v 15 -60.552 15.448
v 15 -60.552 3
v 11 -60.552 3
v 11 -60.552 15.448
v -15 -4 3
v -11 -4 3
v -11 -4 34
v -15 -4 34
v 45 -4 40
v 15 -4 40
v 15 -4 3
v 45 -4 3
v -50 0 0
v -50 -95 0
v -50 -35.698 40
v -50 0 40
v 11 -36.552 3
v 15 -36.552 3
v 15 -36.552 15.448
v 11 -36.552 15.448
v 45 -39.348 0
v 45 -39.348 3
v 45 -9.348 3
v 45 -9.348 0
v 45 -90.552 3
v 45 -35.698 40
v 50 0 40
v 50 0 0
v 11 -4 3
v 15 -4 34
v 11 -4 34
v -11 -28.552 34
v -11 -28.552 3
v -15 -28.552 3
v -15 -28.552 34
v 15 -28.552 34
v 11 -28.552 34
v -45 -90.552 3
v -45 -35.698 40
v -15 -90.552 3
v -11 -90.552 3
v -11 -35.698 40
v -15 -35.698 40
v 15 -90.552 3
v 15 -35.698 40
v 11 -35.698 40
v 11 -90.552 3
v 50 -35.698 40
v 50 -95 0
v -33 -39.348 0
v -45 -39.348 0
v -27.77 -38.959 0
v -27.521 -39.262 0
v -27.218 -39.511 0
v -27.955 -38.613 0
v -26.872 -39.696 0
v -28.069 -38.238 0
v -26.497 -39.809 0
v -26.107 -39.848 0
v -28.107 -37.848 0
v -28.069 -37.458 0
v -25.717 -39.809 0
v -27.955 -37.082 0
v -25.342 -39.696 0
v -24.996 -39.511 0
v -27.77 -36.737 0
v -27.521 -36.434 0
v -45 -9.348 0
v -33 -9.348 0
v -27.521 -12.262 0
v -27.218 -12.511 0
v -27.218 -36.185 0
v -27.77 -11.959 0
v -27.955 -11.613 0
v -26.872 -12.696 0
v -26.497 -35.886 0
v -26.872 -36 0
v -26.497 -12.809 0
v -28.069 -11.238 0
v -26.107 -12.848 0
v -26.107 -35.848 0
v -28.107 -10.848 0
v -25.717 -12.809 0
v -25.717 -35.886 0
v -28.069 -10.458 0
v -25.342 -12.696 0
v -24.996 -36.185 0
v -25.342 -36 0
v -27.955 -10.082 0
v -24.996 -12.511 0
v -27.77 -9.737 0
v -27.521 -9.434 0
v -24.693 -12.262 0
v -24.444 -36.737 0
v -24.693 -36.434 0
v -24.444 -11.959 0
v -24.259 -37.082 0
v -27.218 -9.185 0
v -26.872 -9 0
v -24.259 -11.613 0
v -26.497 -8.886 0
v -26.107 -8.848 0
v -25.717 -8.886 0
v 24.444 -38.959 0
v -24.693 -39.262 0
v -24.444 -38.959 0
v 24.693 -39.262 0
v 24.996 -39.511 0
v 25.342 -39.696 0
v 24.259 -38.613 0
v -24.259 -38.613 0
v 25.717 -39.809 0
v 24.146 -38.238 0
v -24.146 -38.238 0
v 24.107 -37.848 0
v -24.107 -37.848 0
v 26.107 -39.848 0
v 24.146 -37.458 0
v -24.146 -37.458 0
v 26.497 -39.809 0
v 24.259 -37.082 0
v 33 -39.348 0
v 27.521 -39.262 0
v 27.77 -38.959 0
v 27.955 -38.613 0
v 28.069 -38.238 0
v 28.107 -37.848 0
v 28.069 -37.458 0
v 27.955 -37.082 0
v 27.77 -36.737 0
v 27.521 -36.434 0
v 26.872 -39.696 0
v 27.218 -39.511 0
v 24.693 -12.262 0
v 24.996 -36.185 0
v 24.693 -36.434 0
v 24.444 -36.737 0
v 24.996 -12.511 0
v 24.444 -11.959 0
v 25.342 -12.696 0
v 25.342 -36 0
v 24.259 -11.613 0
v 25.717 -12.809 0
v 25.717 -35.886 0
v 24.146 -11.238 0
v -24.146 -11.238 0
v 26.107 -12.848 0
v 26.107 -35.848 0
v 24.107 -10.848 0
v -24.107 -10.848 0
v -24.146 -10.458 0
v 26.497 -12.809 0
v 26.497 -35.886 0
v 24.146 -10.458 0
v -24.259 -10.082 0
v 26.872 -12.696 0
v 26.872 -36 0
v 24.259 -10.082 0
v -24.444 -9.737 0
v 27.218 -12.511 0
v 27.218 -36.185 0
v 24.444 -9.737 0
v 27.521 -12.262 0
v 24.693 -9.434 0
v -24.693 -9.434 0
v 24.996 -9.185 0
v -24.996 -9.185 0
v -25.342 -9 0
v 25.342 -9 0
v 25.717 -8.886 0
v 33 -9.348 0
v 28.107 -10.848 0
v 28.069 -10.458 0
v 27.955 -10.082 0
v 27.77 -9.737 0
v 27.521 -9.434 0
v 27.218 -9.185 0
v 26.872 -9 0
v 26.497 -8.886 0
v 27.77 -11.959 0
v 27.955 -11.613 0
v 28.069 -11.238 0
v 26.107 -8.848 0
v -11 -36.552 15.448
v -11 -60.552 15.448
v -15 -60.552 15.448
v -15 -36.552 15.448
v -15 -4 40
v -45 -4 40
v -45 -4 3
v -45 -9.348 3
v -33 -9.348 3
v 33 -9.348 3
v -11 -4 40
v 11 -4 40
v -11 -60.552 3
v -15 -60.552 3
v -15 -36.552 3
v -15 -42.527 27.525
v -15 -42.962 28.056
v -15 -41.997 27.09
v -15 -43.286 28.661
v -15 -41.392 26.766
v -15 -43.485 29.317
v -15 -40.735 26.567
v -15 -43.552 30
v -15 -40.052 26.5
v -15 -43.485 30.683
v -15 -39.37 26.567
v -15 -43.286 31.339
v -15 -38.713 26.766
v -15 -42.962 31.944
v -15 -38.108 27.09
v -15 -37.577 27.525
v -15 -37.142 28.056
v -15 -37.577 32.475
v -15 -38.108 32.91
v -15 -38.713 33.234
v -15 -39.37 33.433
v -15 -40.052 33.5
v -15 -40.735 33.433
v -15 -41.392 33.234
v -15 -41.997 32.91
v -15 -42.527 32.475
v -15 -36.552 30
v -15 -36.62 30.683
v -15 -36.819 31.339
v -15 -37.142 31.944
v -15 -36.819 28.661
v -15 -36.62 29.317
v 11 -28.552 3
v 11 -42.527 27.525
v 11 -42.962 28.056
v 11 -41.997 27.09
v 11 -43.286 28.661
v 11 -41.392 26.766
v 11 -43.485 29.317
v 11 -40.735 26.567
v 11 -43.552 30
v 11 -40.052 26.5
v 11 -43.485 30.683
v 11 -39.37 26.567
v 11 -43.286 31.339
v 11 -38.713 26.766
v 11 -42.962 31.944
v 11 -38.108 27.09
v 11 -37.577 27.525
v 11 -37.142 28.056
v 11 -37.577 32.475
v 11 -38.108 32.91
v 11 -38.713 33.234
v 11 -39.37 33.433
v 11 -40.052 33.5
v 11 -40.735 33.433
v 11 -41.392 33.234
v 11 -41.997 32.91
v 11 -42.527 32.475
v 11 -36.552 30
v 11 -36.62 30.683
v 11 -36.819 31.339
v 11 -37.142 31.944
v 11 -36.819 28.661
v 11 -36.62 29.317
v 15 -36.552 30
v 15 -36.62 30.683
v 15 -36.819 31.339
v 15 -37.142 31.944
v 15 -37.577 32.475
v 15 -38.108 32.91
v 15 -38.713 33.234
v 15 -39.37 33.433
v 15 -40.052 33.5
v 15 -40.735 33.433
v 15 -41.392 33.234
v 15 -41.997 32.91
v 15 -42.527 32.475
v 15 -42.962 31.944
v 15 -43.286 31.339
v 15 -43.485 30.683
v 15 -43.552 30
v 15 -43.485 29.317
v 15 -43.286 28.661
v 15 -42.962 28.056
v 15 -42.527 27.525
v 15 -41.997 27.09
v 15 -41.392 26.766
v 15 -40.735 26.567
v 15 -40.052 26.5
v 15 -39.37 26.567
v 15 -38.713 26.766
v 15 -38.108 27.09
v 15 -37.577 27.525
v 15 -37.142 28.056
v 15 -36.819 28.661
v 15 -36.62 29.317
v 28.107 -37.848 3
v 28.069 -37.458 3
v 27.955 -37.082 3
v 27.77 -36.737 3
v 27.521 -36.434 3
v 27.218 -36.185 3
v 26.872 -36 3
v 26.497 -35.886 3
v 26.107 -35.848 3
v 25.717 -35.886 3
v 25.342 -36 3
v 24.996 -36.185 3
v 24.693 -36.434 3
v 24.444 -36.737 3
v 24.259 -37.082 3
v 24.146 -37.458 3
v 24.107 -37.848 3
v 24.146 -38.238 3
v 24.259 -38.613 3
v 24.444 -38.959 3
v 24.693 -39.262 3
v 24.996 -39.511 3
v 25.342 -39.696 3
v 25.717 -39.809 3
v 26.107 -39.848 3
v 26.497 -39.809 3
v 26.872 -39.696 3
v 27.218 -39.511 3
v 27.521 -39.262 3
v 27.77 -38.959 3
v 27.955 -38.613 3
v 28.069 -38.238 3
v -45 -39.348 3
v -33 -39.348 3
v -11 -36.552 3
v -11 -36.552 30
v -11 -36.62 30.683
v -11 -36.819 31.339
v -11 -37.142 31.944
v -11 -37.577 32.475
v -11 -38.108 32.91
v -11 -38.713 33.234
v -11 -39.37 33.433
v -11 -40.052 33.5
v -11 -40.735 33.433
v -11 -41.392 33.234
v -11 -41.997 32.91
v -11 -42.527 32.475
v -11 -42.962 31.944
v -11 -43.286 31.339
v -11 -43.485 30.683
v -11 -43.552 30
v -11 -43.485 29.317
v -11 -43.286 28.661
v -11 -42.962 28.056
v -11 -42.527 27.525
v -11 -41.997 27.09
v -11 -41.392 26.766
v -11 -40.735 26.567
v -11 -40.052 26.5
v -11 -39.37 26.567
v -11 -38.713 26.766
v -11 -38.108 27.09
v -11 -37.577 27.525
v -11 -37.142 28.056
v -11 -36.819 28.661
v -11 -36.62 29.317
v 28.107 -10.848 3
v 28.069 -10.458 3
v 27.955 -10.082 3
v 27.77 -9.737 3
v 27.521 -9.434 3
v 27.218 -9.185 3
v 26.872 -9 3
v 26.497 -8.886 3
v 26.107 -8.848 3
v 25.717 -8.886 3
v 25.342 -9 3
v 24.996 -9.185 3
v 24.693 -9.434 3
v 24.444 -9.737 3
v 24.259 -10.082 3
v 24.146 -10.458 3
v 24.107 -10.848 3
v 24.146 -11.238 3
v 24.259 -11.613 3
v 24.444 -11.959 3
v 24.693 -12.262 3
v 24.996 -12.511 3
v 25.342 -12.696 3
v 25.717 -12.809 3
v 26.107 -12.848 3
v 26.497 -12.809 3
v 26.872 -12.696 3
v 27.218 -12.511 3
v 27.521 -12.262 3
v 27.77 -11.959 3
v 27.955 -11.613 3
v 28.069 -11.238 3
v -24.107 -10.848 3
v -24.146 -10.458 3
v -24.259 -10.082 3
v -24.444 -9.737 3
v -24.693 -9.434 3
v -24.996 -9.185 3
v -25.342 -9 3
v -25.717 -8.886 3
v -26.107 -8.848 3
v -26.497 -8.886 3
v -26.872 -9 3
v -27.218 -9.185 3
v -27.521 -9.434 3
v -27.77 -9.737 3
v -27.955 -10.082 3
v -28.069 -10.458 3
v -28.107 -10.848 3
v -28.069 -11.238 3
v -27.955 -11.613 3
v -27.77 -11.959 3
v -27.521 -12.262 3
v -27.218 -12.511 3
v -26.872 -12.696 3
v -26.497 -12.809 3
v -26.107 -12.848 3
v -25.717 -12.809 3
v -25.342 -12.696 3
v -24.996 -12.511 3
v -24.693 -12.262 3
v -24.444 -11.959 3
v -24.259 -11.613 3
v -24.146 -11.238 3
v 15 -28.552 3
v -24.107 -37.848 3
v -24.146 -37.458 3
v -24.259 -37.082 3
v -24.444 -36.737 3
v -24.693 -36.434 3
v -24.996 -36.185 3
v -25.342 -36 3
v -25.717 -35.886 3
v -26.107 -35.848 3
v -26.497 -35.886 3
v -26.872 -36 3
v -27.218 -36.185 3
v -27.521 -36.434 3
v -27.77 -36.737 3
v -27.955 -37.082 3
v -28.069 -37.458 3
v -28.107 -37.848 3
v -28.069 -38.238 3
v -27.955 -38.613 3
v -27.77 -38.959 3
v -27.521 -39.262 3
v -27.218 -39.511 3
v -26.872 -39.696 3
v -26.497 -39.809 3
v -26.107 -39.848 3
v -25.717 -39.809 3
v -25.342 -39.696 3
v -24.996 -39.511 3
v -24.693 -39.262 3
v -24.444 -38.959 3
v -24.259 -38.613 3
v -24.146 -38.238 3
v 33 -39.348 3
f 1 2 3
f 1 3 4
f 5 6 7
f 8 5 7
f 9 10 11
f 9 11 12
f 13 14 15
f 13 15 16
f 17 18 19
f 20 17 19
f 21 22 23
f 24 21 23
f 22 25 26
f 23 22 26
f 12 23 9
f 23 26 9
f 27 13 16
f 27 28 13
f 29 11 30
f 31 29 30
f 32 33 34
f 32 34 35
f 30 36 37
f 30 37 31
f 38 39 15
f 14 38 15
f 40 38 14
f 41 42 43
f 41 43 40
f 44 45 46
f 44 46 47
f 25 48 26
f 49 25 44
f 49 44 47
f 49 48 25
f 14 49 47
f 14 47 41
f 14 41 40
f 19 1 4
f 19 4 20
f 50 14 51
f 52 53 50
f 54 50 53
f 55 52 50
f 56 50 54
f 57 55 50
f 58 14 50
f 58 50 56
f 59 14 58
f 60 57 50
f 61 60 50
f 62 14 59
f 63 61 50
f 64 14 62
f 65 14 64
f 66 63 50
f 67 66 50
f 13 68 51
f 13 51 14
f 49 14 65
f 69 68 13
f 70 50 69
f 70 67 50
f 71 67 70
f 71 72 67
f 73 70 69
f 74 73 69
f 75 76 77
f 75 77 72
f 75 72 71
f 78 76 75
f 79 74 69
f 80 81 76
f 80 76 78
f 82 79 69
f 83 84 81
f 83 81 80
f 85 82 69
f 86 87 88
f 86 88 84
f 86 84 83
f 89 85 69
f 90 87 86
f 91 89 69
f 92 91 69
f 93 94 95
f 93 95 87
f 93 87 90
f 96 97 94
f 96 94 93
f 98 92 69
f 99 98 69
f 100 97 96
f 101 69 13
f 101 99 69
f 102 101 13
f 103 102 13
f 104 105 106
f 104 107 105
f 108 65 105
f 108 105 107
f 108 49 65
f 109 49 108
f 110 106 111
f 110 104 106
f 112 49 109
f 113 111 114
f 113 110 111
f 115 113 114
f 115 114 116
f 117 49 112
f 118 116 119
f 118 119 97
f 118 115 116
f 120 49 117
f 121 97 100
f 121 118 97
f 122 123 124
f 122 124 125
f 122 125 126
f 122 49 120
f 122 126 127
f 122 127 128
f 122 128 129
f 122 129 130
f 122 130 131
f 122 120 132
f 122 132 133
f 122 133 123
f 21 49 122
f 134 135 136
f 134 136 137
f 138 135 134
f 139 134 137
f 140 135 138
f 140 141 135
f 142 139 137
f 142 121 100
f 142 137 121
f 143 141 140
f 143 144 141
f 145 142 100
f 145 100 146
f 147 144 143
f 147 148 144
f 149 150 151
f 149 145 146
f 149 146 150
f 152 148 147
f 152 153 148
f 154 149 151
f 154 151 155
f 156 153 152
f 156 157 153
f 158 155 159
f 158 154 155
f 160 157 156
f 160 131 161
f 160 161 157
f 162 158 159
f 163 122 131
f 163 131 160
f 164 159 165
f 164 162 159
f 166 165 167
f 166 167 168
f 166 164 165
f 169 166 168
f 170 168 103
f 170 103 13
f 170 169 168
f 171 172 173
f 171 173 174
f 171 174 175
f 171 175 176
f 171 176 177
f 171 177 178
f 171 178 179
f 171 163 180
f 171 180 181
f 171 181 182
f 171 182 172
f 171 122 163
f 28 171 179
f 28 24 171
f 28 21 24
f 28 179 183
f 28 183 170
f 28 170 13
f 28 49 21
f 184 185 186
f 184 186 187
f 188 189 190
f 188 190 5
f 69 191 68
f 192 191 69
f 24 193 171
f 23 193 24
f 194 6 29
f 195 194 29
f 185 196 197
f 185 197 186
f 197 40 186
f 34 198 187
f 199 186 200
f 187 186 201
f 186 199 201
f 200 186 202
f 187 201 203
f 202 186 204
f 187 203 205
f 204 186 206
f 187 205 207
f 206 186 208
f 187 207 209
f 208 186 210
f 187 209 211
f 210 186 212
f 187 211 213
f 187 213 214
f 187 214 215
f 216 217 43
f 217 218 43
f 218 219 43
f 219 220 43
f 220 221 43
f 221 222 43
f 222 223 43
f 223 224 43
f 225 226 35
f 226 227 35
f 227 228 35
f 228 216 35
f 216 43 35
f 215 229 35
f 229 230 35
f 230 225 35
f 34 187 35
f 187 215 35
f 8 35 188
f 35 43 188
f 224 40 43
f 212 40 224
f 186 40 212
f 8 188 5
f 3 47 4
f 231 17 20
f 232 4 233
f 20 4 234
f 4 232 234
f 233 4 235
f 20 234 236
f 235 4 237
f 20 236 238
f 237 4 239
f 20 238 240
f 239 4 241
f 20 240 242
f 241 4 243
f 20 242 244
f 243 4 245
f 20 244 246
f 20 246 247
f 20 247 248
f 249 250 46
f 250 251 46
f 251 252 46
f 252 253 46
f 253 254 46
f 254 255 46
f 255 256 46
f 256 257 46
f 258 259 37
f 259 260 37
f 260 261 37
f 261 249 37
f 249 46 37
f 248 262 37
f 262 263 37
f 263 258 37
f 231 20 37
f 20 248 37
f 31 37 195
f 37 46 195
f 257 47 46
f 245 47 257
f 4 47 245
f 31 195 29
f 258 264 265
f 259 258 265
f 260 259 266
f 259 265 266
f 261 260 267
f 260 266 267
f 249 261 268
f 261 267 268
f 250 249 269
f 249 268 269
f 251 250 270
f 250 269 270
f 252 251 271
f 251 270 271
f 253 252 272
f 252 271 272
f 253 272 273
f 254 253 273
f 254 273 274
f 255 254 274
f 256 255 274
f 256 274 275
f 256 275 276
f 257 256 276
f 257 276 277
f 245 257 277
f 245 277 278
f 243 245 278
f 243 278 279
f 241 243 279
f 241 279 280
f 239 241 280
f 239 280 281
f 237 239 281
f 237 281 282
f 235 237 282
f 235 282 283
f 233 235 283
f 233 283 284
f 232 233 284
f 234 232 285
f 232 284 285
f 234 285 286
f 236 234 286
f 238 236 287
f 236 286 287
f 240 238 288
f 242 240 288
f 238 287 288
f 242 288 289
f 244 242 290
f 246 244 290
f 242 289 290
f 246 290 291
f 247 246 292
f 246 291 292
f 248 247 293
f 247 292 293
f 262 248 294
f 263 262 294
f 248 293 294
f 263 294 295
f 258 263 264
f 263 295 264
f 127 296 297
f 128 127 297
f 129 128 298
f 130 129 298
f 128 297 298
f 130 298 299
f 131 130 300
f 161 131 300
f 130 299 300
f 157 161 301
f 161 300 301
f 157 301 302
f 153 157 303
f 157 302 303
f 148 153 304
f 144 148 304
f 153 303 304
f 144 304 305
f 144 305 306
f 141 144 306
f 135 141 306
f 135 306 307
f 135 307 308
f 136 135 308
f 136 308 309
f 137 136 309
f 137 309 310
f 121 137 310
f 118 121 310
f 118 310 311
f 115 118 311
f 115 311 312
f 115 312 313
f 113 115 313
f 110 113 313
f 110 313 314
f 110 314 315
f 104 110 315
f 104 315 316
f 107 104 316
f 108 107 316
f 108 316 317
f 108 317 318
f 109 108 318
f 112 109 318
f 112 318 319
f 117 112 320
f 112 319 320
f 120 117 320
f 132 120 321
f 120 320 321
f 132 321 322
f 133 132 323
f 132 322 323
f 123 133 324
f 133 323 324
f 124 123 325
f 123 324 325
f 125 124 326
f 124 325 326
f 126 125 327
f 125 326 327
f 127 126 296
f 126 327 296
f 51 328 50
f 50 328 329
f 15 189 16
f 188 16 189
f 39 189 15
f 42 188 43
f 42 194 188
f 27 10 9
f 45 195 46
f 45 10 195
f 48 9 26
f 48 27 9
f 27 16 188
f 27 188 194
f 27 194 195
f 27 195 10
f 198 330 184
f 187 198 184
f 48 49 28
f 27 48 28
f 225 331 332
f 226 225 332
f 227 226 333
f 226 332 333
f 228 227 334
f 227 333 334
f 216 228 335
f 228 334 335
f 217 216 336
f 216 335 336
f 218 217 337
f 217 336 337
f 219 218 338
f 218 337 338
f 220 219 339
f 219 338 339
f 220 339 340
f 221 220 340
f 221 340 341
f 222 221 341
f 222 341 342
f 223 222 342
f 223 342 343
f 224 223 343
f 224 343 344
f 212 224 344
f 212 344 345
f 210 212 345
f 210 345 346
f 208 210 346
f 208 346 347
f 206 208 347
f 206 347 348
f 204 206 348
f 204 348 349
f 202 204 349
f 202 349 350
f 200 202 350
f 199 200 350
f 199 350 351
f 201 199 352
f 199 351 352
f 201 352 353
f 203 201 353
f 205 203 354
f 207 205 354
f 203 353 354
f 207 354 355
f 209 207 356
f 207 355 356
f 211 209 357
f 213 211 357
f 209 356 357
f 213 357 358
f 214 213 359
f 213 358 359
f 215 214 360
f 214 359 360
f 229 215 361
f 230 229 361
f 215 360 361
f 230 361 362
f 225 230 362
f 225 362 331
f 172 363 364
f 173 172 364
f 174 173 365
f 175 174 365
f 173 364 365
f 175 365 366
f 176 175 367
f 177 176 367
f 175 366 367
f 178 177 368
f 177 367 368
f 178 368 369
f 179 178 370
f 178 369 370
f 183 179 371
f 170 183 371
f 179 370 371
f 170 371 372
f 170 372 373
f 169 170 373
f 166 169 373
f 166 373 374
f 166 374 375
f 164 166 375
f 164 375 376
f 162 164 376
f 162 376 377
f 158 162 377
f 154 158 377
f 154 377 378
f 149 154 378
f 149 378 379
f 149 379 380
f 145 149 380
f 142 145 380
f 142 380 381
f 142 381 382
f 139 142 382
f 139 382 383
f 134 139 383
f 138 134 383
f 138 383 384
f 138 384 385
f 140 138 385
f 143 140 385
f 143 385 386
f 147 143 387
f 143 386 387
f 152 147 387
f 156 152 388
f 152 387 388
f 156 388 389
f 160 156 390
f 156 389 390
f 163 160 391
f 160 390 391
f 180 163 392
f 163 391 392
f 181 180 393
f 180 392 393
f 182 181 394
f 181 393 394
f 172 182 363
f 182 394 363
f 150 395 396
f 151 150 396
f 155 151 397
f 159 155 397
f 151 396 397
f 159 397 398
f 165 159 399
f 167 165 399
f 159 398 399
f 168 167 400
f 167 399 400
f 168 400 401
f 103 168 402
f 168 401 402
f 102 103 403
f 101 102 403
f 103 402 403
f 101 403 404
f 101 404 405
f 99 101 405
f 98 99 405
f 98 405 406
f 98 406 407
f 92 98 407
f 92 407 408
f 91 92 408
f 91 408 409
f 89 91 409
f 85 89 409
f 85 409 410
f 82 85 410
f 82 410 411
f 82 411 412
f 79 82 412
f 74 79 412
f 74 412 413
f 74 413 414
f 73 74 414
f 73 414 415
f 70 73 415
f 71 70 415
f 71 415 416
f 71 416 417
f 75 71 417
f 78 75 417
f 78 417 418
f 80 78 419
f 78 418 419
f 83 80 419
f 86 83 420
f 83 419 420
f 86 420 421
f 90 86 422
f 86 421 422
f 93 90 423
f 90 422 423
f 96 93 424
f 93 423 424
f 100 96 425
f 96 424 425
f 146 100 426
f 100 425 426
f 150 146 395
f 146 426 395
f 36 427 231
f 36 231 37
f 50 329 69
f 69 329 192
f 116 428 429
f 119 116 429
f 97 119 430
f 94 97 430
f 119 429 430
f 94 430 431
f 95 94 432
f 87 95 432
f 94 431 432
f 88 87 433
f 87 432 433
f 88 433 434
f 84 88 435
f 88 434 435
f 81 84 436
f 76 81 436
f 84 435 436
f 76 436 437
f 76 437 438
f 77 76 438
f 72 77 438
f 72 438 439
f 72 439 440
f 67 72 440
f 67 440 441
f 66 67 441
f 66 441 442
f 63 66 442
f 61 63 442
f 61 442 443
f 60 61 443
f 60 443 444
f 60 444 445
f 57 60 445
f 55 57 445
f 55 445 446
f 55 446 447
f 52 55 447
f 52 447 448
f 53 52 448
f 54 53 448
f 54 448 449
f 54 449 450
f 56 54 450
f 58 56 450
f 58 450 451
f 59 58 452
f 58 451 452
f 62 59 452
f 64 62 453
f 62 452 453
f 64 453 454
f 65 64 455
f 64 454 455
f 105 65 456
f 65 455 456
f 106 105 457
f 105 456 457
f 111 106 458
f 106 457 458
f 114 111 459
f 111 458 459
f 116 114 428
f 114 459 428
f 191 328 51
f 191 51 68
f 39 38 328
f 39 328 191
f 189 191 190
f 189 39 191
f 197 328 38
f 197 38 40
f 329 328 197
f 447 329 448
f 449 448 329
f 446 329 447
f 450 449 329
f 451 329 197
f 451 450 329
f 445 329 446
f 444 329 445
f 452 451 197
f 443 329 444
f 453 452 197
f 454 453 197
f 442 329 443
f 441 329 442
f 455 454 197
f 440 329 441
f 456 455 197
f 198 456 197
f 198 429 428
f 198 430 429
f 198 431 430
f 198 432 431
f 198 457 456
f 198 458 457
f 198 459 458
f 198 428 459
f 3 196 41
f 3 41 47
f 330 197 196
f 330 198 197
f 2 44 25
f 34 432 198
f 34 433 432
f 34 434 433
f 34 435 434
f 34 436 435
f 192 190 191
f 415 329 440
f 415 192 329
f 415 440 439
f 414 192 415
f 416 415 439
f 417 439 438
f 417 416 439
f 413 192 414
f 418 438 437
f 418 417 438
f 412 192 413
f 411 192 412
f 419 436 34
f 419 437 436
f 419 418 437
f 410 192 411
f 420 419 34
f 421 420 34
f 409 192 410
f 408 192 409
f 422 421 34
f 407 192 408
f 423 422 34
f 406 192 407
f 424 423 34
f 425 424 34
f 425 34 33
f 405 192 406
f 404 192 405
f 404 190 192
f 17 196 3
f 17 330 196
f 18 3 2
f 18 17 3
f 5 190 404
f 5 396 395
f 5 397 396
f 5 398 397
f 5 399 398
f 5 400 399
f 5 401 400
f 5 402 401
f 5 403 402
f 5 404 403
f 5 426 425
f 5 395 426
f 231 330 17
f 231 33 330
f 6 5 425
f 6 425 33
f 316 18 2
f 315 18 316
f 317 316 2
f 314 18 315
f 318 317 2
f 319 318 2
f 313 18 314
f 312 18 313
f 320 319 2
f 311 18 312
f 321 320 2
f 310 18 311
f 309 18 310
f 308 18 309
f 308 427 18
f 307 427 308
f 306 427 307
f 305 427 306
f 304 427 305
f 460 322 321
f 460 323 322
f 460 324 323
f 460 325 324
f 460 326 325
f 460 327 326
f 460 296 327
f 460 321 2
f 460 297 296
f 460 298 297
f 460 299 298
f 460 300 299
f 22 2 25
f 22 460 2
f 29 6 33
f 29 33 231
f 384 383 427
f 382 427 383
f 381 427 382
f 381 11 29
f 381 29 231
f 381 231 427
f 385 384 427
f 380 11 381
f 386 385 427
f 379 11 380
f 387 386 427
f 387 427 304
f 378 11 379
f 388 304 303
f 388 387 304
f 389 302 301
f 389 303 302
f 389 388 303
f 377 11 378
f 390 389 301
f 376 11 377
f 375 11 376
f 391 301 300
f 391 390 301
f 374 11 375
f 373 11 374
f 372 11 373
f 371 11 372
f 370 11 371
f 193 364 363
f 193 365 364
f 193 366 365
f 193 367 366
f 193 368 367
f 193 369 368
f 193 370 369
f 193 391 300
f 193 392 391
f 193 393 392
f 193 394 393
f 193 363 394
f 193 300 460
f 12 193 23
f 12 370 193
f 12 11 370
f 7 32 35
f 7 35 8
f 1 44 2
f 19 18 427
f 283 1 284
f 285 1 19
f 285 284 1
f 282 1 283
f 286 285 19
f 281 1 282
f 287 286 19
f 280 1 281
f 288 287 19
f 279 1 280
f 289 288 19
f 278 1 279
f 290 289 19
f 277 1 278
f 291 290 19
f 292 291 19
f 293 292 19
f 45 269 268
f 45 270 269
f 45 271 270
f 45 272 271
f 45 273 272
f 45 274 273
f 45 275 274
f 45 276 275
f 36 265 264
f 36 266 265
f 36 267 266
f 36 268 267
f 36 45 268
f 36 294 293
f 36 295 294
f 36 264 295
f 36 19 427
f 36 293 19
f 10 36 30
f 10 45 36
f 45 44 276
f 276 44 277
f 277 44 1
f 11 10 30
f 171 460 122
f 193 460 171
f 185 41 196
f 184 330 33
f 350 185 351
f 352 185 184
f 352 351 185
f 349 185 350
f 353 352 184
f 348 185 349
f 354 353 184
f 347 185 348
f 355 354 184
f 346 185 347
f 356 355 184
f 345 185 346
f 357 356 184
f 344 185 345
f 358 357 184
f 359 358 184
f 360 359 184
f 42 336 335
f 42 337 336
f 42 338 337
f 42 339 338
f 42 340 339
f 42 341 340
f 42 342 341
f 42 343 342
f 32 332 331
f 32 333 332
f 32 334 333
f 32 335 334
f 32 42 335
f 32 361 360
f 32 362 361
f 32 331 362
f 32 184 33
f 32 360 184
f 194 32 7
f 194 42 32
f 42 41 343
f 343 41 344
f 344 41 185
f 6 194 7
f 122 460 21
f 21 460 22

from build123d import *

# Parameters (mm, degrees)
F1_DEPTH = 50
F2_W     = 30
F2_H     = 91
F2_W_2   = 22
F3_DEPTH = 37
F4_W     = 24
F4_H     = 12.44826
F4_R     = 3.5
F4_W_2   = 24.552317
F4_H_2   = 31
F5_DEPTH = 30
F6_W     = 12
F6_H     = 30
F6_R     = 2
F7_DEPTH = 3.001


with BuildPart() as f1:
    # F0 (on Right) → F1 (new body, symmetric)
    with BuildSketch(Plane.YZ):
        Polygon((0, 40), (-35.697561, 40), (-95, 0), (0, 0), align=None)
    extrude(amount=F1_DEPTH, both=True)

    # F2 (on face) → F3 (cut)
    with BuildSketch(Plane.XY.offset(40)):
        with Locations((-30, -49.5)):
            Rectangle(F2_W, F2_H)
        with Locations((30, -49.5)):
            Rectangle(F2_W, F2_H)
        with Locations((0, -49.5)):
            Rectangle(F2_W_2, F2_H)
    extrude(amount=-F3_DEPTH, mode=Mode.SUBTRACT)

    # F4 (on face) → F5 (cut, through all)
    with BuildSketch(Plane.YZ.offset(15)):
        with Locations((-48.552317, 9.22413)):
            Rectangle(F4_W, F4_H)
        with Locations((-40.052317, 30)):
            Circle(F4_R)
        with Locations((-16.276159, 18.5)):
            Rectangle(F4_W_2, F4_H_2)
    extrude(amount=-F5_DEPTH, mode=Mode.SUBTRACT)

    # F6 (on face) → F7 (cut, through all)
    with BuildSketch(Plane.XY.offset(3)):
        with Locations((-39, -24.347831)):
            Rectangle(F6_W, F6_H)
        with Locations((39, -24.347831)):
            Rectangle(F6_W, F6_H)
        with Locations((-26.107078, -10.847831)):
            Circle(F6_R)
        with Locations((-26.107078, -37.847831)):
            Circle(F6_R)
        with Locations((26.107078, -10.847831)):
            Circle(F6_R)
        with Locations((26.107078, -37.847831)):
            Circle(F6_R)
    extrude(amount=-F7_DEPTH, mode=Mode.SUBTRACT)


solid = f1.part
